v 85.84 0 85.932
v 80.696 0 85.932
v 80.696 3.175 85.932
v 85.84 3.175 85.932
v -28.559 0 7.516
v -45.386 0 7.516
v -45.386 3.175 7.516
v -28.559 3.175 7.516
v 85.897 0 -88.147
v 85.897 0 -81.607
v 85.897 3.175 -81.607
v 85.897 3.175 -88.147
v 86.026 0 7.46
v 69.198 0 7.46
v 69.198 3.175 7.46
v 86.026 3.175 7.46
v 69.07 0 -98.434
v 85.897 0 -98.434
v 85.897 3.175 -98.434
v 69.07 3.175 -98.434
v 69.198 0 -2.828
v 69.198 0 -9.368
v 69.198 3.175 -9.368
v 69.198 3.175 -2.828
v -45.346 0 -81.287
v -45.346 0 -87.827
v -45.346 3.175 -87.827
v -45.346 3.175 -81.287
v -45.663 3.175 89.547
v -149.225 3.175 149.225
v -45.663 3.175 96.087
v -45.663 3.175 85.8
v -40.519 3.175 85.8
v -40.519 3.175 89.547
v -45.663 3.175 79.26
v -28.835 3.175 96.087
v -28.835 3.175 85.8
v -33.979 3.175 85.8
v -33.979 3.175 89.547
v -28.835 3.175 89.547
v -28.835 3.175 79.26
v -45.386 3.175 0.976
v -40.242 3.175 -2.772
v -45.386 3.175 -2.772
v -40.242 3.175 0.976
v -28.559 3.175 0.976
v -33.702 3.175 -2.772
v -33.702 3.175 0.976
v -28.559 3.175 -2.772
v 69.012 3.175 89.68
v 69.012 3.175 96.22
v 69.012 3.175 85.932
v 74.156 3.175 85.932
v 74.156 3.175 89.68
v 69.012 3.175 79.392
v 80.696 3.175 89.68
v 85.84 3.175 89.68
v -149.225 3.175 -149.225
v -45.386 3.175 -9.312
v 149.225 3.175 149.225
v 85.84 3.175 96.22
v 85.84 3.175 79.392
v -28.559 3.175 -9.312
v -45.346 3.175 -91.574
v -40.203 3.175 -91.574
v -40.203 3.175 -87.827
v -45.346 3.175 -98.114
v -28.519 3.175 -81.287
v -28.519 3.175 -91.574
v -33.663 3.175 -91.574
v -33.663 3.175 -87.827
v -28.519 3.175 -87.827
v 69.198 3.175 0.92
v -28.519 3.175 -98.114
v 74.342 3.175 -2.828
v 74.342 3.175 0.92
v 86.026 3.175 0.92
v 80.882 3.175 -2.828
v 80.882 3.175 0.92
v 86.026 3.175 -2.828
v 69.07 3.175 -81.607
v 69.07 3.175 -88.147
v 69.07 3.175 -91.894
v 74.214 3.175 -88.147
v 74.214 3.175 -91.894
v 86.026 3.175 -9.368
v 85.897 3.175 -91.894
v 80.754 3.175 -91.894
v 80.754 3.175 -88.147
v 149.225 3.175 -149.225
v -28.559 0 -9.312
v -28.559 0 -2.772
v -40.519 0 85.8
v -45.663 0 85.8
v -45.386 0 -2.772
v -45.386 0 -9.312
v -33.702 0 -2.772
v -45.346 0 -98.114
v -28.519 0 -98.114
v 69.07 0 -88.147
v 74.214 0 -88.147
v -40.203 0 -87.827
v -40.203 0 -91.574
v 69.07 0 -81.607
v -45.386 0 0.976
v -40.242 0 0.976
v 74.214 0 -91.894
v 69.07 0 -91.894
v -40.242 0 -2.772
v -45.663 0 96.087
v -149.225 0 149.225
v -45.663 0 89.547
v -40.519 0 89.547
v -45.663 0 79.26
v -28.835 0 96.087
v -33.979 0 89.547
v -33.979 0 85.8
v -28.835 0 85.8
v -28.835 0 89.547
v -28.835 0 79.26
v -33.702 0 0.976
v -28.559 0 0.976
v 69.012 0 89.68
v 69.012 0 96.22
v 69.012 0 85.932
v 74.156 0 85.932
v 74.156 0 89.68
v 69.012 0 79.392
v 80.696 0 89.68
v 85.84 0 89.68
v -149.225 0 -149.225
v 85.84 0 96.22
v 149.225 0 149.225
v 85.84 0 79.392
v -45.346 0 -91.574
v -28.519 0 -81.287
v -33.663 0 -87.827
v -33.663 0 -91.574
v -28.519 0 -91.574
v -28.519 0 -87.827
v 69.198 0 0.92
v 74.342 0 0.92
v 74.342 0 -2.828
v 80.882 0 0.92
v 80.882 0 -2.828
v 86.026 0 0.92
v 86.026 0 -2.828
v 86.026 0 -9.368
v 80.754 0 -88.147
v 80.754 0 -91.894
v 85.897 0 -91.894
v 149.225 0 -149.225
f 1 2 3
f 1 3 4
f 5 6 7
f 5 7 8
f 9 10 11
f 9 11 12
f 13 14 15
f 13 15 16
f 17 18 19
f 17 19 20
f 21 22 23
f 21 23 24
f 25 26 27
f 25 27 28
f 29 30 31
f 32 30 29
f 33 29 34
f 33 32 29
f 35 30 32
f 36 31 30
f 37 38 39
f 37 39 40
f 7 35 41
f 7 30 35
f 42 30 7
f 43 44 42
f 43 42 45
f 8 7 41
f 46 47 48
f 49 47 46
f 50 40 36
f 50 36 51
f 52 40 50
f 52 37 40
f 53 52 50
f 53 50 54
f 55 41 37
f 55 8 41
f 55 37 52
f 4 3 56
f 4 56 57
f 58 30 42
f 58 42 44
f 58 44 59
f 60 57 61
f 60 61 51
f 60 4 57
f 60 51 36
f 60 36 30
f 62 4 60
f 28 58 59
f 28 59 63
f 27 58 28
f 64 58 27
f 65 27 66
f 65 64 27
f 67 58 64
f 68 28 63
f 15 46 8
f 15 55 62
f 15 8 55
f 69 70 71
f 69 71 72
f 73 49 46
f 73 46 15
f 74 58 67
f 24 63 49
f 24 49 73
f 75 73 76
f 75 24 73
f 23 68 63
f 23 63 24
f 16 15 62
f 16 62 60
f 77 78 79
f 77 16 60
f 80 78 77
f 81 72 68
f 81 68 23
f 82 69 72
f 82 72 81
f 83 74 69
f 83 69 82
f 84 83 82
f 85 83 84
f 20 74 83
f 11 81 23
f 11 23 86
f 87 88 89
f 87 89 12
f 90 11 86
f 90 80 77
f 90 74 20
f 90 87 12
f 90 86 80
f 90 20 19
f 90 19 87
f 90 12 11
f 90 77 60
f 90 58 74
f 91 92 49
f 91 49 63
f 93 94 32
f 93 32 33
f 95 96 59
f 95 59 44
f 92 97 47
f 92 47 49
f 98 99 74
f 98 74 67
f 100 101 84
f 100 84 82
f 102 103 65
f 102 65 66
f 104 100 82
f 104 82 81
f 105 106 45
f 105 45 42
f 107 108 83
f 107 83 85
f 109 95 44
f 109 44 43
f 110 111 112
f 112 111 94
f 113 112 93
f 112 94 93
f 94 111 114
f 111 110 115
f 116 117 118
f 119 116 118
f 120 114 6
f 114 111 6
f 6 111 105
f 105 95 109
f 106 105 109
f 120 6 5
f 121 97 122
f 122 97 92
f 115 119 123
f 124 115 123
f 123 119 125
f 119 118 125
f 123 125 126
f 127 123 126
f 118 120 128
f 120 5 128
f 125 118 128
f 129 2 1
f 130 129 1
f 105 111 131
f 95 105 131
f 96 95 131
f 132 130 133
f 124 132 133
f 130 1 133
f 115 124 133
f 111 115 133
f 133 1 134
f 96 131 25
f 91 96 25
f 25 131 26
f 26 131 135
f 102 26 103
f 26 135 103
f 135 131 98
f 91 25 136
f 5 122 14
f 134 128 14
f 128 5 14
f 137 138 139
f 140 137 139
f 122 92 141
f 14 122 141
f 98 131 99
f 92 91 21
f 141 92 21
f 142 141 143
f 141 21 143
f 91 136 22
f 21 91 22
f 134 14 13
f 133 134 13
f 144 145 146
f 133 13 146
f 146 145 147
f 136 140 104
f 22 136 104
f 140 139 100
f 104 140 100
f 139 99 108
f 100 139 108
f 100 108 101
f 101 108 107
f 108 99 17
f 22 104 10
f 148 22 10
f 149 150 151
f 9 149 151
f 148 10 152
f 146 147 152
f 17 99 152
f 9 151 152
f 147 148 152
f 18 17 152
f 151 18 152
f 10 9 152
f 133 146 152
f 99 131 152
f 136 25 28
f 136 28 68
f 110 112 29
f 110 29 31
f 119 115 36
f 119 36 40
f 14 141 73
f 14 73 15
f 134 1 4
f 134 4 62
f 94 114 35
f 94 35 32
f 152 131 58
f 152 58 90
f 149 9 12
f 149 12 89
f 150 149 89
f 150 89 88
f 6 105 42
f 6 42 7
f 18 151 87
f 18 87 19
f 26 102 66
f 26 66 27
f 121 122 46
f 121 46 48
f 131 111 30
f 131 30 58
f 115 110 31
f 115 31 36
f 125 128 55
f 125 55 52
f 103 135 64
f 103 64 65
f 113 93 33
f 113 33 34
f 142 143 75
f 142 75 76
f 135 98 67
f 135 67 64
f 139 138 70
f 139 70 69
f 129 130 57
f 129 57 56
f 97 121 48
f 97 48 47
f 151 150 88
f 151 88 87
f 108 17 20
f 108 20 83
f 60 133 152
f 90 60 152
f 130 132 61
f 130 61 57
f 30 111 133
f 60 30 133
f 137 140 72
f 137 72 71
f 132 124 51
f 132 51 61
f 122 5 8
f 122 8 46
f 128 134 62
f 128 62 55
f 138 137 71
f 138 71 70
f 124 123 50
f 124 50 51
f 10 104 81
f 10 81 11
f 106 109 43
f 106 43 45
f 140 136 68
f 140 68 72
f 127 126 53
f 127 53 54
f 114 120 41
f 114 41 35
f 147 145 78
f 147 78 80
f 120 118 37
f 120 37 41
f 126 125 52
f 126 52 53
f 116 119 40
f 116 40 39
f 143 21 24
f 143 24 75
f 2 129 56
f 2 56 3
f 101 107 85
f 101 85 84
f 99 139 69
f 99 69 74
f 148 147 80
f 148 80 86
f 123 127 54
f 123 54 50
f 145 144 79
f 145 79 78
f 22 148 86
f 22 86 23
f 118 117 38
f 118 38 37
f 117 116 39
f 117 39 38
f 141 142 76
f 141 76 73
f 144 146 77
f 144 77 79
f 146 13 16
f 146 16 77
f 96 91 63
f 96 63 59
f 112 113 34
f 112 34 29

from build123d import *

# Parameters (mm, degrees)
SKETCH1_W           = 298.45
SKETCH1_H           = 298.45
BOSS_EXTRUDE1_DEPTH = 3.175


with BuildPart() as part:
    # Sketch1 → Boss-Extrude1 (new body)
    with BuildSketch(Plane(origin=(0, 0, 0), x_dir=(1, 0, 0), z_dir=(0, 1, 0))):
        Rectangle(SKETCH1_W, SKETCH1_H)
        Polygon((-45.662750287, -79.259778814), (-45.662750287, -85.799778814), (-40.519000287, -85.799778814), (-40.519000287, -89.547278814), (-45.662750287, -89.547278814), (-45.662750287, -96.087278814), (-28.835250287, -96.087278814), (-28.835250287, -89.547278814), (-33.979000287, -89.547278814), (-33.979000287, -85.799778814), (-28.835250287, -85.799778814), (-28.835250287, -79.259778814), align=None, mode=Mode.SUBTRACT)
        Polygon((-45.386244925, 9.311765916), (-45.386244925, 2.771765916), (-40.242494925, 2.771765916), (-40.242494925, -0.975734084), (-45.386244925, -0.975734084), (-45.386244925, -7.515734084), (-28.558744925, -7.515734084), (-28.558744925, -0.975734084), (-33.702494925, -0.975734084), (-33.702494925, 2.771765916), (-28.558744925, 2.771765916), (-28.558744925, 9.311765916), align=None, mode=Mode.SUBTRACT)
        Polygon((-45.346455929, 98.114077939), (-45.346455929, 91.574077939), (-40.202705929, 91.574077939), (-40.202705929, 87.826577939), (-45.346455929, 87.826577939), (-45.346455929, 81.286577939), (-28.518955929, 81.286577939), (-28.518955929, 87.826577939), (-33.662705929, 87.826577939), (-33.662705929, 91.574077939), (-28.518955929, 91.574077939), (-28.518955929, 98.114077939), align=None, mode=Mode.SUBTRACT)
        Polygon((69.069867305, 98.43417478), (69.069867305, 91.89417478), (74.213617305, 91.89417478), (74.213617305, 88.14667478), (69.069867305, 88.14667478), (69.069867305, 81.60667478), (85.897367305, 81.60667478), (85.897367305, 88.14667478), (80.753617305, 88.14667478), (80.753617305, 91.89417478), (85.897367305, 91.89417478), (85.897367305, 98.43417478), align=None, mode=Mode.SUBTRACT)
        Polygon((69.198133818, 9.367790367), (69.198133818, 2.827790367), (74.341883818, 2.827790367), (74.341883818, -0.919709633), (69.198133818, -0.919709633), (69.198133818, -7.459709633), (86.025633818, -7.459709633), (86.025633818, -0.919709633), (80.881883818, -0.919709633), (80.881883818, 2.827790367), (86.025633818, 2.827790367), (86.025633818, 9.367790367), align=None, mode=Mode.SUBTRACT)
        Polygon((69.012405726, -79.392168006), (69.012405726, -85.932168006), (74.156155726, -85.932168006), (74.156155726, -89.679668006), (69.012405726, -89.679668006), (69.012405726, -96.219668006), (85.839905726, -96.219668006), (85.839905726, -89.679668006), (80.696155726, -89.679668006), (80.696155726, -85.932168006), (85.839905726, -85.932168006), (85.839905726, -79.392168006), align=None, mode=Mode.SUBTRACT)
    extrude(amount=BOSS_EXTRUDE1_DEPTH)


solid = part.part
